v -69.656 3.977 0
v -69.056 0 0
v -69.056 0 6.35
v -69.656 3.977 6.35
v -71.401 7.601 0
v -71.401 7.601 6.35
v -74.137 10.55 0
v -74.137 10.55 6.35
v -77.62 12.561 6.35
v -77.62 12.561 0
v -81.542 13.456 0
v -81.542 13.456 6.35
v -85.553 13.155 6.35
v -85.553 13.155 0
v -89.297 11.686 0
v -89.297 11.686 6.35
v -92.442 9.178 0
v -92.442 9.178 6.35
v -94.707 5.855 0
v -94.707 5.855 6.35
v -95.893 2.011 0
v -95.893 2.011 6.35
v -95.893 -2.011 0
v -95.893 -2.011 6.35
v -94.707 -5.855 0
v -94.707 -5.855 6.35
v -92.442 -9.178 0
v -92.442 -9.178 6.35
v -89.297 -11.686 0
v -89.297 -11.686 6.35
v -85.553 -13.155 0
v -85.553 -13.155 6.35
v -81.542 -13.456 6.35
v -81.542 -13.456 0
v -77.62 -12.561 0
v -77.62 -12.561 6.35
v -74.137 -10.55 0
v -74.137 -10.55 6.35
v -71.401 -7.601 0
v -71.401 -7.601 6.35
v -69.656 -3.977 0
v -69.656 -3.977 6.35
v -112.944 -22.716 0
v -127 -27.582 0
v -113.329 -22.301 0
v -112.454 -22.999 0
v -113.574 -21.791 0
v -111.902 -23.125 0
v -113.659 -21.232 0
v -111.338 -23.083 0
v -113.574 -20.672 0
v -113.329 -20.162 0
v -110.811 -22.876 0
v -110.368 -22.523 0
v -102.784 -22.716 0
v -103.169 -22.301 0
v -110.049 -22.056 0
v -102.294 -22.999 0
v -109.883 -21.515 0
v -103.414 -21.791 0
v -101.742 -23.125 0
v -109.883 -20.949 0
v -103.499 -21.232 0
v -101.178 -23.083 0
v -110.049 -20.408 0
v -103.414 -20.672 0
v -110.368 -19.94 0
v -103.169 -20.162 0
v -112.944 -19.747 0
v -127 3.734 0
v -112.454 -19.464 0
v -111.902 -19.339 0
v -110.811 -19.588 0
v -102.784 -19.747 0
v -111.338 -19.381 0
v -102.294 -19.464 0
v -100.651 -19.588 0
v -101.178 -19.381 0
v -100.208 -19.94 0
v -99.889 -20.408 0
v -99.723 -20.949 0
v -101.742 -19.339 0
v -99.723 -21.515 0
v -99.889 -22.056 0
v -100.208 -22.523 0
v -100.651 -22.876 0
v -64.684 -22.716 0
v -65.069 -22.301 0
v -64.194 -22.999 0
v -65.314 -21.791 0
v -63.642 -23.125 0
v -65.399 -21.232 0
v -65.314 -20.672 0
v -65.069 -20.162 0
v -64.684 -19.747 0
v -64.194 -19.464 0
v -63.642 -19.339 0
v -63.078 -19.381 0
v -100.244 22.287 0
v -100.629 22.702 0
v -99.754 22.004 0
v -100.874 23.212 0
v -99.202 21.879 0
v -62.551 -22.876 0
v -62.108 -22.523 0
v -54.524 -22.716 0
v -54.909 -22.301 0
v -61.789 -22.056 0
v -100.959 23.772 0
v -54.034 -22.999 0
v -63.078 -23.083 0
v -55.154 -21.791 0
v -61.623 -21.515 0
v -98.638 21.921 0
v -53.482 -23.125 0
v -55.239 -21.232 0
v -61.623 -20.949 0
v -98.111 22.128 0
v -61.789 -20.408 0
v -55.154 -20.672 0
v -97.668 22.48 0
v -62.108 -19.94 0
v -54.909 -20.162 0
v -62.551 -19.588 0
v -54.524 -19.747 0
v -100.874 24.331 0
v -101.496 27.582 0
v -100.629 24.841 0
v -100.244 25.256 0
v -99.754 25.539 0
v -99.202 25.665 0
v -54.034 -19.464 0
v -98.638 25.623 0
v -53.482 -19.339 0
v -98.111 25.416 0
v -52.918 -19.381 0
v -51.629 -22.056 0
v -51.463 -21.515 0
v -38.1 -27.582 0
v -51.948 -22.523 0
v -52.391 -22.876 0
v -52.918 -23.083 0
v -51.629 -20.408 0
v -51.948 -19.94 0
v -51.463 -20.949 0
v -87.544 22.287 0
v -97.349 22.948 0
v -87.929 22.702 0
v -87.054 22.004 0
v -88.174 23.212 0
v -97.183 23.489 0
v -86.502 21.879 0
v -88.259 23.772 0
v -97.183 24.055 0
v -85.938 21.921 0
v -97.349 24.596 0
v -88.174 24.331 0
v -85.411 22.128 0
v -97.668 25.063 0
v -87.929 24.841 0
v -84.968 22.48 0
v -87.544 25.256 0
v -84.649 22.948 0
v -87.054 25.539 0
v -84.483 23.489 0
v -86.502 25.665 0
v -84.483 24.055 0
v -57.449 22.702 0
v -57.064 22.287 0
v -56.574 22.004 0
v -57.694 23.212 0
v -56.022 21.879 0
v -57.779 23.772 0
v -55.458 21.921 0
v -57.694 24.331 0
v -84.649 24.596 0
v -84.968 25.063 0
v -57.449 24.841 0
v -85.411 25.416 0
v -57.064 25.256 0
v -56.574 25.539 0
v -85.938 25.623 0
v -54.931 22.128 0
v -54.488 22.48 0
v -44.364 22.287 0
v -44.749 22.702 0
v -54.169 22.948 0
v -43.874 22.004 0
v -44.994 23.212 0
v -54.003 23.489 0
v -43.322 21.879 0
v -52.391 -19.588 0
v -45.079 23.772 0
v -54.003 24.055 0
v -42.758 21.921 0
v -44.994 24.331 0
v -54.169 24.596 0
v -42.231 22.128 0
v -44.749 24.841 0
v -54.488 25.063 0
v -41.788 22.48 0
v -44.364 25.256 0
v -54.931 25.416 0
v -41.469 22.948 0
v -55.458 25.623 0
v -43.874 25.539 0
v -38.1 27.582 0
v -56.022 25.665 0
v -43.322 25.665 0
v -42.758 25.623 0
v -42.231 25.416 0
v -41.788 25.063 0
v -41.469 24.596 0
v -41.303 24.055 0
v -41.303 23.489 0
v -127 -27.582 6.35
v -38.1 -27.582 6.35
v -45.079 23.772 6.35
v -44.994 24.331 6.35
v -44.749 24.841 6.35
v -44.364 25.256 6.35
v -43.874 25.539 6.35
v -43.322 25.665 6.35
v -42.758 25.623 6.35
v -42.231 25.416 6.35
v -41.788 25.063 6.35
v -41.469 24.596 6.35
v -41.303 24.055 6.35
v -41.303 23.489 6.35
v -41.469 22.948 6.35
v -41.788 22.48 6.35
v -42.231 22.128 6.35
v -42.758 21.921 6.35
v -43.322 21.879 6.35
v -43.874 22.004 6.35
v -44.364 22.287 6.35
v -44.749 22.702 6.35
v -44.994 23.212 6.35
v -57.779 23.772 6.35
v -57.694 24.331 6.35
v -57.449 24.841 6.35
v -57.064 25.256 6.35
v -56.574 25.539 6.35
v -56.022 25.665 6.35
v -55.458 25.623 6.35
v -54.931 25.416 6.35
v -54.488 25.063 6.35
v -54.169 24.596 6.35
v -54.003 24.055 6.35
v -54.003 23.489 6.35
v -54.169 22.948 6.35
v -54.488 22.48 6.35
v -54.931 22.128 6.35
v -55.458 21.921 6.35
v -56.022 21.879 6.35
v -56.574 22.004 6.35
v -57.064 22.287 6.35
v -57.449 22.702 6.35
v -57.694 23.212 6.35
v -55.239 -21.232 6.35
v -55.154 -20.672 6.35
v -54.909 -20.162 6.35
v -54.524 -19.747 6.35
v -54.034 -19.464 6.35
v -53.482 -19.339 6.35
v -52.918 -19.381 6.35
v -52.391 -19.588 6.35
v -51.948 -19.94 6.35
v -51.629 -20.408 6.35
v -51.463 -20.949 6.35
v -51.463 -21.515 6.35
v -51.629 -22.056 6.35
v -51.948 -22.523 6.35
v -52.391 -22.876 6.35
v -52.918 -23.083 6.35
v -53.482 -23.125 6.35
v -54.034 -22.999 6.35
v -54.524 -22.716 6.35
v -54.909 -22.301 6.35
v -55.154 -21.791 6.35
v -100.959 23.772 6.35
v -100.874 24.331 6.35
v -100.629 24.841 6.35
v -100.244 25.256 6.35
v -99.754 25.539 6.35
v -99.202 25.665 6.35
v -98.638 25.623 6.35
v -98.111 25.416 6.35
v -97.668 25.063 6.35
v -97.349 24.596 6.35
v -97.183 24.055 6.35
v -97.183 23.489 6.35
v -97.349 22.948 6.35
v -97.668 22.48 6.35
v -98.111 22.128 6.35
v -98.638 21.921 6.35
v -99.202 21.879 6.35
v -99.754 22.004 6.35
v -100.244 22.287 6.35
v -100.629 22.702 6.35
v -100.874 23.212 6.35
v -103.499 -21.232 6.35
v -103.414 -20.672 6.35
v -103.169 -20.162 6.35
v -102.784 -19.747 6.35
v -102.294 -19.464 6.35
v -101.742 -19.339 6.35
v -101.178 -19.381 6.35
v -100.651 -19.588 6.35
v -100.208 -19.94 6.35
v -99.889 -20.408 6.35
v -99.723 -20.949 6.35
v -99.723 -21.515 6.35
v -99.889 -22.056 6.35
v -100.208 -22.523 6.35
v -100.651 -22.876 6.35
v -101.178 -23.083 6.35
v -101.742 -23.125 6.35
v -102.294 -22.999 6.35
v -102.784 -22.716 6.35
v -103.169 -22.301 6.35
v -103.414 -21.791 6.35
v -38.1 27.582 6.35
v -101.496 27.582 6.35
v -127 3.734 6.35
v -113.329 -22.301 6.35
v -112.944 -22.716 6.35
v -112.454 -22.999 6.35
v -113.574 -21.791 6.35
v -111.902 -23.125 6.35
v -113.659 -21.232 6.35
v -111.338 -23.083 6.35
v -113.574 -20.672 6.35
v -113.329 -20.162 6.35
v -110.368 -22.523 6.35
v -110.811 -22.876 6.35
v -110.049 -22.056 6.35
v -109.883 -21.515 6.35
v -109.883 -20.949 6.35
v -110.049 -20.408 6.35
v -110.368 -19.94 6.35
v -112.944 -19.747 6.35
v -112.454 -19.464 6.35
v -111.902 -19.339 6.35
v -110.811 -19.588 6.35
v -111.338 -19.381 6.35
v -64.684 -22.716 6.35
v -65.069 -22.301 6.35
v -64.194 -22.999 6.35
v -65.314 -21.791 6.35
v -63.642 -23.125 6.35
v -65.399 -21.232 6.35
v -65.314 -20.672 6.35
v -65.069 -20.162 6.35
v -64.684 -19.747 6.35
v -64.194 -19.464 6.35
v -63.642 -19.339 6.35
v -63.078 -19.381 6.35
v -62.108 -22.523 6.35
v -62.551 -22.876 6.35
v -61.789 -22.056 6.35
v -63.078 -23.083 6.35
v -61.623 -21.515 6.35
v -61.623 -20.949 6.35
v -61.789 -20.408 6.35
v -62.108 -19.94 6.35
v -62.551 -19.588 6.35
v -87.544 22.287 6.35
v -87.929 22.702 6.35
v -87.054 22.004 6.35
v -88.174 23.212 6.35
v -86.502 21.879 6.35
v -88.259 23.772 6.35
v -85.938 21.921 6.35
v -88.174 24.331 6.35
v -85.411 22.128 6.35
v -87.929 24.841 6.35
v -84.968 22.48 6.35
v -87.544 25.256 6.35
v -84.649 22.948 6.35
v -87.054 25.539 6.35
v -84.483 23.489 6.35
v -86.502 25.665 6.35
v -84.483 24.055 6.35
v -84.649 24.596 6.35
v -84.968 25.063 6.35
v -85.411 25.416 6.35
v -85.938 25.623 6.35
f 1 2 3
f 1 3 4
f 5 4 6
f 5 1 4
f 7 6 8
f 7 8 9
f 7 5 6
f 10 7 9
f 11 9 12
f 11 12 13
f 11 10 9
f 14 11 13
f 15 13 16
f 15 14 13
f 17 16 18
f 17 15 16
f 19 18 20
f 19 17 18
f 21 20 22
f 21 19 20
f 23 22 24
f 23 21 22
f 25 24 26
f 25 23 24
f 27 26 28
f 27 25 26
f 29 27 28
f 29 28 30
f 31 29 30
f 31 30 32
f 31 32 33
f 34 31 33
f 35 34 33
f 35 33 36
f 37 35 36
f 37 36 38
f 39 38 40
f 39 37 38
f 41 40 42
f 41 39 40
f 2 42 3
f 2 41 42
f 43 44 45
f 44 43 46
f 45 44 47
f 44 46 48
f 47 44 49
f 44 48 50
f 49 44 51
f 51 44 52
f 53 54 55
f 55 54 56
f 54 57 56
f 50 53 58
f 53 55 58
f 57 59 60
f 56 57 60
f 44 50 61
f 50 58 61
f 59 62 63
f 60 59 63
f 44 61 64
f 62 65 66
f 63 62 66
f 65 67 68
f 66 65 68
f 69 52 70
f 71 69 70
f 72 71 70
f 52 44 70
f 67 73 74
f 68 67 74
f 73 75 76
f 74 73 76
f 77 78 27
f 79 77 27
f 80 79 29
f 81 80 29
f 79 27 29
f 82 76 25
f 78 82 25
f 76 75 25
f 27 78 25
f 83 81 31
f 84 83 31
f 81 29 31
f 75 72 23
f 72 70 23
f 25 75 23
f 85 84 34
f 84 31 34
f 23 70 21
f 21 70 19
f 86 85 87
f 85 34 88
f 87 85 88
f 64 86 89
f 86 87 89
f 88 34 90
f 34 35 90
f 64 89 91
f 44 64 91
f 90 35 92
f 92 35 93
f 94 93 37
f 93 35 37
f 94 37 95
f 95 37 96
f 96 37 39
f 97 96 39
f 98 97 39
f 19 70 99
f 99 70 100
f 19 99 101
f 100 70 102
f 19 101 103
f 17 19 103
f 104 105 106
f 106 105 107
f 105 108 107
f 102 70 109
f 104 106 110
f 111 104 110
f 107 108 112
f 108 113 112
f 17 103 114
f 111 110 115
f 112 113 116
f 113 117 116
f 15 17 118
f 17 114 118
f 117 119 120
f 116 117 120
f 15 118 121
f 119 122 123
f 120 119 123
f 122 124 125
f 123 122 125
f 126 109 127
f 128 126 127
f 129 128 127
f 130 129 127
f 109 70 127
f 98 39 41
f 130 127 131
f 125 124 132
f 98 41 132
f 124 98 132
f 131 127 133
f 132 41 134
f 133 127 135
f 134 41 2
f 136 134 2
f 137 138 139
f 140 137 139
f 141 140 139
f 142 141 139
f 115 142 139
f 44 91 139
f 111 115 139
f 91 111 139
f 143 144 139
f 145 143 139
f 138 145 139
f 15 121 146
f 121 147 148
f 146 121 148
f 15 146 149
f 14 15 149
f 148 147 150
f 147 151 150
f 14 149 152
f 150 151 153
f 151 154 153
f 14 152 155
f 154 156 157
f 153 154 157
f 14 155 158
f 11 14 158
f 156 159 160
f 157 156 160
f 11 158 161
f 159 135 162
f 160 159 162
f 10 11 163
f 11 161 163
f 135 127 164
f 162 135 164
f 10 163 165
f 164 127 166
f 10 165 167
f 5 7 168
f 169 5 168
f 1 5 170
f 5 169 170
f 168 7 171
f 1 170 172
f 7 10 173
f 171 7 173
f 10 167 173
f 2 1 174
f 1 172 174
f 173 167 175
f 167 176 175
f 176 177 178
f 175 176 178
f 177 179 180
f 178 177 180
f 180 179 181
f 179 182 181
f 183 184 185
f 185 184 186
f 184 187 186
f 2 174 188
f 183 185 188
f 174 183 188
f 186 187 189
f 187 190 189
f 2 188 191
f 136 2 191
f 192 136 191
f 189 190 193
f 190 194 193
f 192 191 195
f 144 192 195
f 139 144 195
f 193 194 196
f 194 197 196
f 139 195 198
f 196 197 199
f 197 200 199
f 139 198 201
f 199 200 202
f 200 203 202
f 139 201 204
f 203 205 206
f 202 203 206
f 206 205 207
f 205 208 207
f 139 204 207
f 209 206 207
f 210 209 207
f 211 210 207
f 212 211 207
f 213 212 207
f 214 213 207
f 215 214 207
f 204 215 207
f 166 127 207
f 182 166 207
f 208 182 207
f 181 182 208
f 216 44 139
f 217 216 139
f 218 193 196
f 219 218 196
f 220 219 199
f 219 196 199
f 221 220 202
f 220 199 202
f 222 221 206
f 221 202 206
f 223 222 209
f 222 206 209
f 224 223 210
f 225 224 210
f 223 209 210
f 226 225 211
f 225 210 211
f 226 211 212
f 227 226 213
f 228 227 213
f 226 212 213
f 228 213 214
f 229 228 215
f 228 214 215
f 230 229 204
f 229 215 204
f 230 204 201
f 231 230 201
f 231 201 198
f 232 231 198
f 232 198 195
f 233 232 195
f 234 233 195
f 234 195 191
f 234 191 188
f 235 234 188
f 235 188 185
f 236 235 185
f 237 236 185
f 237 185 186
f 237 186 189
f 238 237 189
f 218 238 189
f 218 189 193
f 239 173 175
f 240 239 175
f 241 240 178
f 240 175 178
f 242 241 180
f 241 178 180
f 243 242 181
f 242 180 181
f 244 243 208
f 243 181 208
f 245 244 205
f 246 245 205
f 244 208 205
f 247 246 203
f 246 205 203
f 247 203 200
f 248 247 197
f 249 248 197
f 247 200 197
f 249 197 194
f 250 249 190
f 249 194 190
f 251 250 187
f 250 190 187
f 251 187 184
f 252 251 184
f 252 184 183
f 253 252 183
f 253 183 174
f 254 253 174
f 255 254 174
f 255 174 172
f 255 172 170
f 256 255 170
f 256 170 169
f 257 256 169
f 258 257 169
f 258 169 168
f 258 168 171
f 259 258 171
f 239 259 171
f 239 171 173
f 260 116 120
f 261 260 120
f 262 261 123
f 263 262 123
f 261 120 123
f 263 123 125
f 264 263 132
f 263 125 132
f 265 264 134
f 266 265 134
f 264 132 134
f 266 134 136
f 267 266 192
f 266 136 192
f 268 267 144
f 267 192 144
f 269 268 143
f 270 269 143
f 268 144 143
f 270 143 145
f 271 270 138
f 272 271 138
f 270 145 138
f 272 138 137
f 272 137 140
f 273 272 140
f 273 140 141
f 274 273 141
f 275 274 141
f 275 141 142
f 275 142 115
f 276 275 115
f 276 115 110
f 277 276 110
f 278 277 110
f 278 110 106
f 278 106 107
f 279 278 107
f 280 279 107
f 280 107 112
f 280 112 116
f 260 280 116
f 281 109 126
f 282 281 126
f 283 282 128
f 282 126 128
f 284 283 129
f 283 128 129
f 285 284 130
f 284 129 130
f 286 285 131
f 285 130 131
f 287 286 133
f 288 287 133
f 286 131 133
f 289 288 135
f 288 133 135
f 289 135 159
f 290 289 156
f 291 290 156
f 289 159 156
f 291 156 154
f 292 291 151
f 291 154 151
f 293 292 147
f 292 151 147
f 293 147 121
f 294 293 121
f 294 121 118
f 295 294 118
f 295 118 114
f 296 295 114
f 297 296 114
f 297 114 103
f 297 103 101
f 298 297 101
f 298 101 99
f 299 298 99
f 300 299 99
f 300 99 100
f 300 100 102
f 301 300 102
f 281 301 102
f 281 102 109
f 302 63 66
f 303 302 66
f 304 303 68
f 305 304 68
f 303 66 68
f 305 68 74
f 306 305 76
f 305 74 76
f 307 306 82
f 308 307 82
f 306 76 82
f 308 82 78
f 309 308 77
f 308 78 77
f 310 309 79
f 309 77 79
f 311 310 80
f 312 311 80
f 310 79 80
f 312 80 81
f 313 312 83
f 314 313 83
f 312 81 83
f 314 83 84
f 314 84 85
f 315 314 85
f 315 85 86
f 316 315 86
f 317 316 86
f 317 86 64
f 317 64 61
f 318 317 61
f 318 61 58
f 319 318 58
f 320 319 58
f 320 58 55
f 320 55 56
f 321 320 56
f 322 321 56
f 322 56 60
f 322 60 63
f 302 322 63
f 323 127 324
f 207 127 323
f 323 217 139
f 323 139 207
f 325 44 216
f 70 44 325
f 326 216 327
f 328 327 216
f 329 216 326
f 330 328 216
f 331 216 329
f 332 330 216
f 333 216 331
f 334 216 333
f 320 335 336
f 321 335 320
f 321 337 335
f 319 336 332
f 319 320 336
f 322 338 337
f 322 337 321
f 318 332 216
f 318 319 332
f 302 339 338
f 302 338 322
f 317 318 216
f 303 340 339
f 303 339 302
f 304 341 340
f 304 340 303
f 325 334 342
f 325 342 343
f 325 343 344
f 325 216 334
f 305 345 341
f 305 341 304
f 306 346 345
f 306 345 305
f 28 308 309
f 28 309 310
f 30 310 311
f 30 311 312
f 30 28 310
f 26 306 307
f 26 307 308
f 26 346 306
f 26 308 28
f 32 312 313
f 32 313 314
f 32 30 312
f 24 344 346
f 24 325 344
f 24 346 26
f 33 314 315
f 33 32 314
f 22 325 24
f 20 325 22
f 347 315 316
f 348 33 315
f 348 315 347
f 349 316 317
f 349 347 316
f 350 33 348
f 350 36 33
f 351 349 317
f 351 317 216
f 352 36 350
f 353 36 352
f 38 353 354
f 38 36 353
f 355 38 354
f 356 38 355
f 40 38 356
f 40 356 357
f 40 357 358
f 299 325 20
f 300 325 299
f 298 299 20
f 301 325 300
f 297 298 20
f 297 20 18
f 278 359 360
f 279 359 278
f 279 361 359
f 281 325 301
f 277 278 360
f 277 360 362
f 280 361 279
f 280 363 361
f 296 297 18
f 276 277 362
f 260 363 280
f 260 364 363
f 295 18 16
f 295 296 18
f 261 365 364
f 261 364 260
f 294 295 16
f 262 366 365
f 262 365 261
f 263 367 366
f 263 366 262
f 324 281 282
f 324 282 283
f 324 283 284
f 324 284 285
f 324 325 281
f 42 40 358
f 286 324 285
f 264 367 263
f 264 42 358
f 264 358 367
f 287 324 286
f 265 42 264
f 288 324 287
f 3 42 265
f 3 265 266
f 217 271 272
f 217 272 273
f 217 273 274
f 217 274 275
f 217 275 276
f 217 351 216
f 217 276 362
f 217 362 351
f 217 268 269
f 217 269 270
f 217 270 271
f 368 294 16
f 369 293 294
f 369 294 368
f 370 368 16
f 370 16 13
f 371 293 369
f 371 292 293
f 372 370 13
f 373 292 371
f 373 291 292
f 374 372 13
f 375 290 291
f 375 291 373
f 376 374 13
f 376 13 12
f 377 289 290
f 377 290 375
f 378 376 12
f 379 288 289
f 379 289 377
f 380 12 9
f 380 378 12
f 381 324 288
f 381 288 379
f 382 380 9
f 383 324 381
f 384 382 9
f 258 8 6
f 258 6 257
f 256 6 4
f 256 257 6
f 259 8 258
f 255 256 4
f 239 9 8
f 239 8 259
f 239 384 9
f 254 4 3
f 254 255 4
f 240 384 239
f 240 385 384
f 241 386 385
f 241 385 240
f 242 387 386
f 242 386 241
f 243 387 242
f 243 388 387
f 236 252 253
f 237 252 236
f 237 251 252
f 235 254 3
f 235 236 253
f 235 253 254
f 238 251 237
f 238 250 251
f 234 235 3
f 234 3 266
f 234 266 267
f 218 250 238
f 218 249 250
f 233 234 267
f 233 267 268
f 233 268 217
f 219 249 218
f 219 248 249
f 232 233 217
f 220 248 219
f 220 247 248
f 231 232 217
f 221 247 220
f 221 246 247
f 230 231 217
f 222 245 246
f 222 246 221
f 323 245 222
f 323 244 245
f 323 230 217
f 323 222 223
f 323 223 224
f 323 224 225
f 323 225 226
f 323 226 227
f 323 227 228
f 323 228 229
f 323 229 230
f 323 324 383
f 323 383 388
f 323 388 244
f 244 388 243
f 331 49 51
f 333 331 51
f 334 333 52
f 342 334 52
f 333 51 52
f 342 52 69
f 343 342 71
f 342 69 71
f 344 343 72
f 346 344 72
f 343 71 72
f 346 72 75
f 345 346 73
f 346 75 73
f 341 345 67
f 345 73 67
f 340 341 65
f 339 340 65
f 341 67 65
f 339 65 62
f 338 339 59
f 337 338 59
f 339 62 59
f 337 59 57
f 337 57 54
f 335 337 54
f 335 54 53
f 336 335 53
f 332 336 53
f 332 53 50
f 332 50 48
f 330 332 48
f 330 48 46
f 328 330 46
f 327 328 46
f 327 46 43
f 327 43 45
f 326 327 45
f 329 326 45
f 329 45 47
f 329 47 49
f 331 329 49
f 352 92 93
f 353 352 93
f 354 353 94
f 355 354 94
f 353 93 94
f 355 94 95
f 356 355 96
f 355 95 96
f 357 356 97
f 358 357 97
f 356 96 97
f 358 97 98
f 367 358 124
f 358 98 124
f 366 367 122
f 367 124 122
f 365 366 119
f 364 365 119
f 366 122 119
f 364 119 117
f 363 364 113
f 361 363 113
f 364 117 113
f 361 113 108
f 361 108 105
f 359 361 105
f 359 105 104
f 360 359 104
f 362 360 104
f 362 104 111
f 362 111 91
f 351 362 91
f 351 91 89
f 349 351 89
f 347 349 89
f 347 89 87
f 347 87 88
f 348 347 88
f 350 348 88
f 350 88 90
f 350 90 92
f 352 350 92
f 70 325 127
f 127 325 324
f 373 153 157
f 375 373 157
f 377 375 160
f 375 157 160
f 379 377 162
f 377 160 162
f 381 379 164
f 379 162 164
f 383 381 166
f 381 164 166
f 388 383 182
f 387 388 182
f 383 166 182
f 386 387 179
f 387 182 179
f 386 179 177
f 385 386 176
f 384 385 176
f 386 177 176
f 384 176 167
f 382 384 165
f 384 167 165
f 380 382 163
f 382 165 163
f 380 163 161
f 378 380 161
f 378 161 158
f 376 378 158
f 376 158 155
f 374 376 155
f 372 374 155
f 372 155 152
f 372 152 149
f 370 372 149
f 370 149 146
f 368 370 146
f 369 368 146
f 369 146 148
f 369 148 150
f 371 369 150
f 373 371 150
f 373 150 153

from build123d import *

# Parameters (mm, degrees)
SKETCH1_W             = 254
SKETCH1_H             = 55.16372
SKETCH1_R             = 13.49375
BOSS_EXTRUDE1_DEPTH   = 6.35
F_6_CLEARANCE_HOLE1_D = 3.7973
SKETCH4_W             = 165.1
SKETCH4_H             = 55.16372
CUT_EXTRUDE1_DEPTH    = 6.35
CUT_EXTRUDE2_DEPTH    = 6.35
F_6_CLEARANCE_HOLE2_D = 3.7973


with BuildPart() as part:
    # Sketch1 → Boss-Extrude1 (new body)
    with BuildSketch(Plane.XY):
        Rectangle(SKETCH1_W, SKETCH1_H)
        with Locations((-82.55, 0)):
            Circle(SKETCH1_R, mode=Mode.SUBTRACT)
        with Locations((82.55, 0)):
            Circle(SKETCH1_R, mode=Mode.SUBTRACT)
    extrude(amount=BOSS_EXTRUDE1_DEPTH)

    # #6 Clearance Hole1 (through all)
    with Locations(Plane.XY.offset(6.35)):
        with Locations((-111.76, -21.23186), (-101.6, -21.23186), (-63.5, -21.23186), (-53.34, -21.23186)):
            f_6_clearance_hole1 = Hole(F_6_CLEARANCE_HOLE1_D / 2)

    # Mirror1: #6 Clearance Hole1 across plane
    add(f_6_clearance_hole1.mirror(Plane.ZY), mode=Mode.SUBTRACT)

    # Sketch4 → Cut-Extrude1 (cut)
    with BuildSketch(Plane.XY.offset(6.35)):
        with Locations((44.45, 0)):
            Rectangle(SKETCH4_W, SKETCH4_H)
    extrude(amount=-CUT_EXTRUDE1_DEPTH, mode=Mode.SUBTRACT)

    # Sketch5 → Cut-Extrude2 (cut)
    with BuildSketch(Plane.XY.offset(6.35)):
        Polygon((-127, 3.733618756), (-101.496237284, 27.58186), (-127, 27.58186), align=None)
    extrude(amount=-CUT_EXTRUDE2_DEPTH, mode=Mode.SUBTRACT)

    # #6 Clearance Hole2 (through all)
    with Locations(Plane.XY.offset(6.35)):
        with Locations((-43.18, 23.77186), (-55.88, 23.77186), (-99.06, 23.77186), (-86.36, 23.77186)):
            Hole(F_6_CLEARANCE_HOLE2_D / 2)


solid = part.part
